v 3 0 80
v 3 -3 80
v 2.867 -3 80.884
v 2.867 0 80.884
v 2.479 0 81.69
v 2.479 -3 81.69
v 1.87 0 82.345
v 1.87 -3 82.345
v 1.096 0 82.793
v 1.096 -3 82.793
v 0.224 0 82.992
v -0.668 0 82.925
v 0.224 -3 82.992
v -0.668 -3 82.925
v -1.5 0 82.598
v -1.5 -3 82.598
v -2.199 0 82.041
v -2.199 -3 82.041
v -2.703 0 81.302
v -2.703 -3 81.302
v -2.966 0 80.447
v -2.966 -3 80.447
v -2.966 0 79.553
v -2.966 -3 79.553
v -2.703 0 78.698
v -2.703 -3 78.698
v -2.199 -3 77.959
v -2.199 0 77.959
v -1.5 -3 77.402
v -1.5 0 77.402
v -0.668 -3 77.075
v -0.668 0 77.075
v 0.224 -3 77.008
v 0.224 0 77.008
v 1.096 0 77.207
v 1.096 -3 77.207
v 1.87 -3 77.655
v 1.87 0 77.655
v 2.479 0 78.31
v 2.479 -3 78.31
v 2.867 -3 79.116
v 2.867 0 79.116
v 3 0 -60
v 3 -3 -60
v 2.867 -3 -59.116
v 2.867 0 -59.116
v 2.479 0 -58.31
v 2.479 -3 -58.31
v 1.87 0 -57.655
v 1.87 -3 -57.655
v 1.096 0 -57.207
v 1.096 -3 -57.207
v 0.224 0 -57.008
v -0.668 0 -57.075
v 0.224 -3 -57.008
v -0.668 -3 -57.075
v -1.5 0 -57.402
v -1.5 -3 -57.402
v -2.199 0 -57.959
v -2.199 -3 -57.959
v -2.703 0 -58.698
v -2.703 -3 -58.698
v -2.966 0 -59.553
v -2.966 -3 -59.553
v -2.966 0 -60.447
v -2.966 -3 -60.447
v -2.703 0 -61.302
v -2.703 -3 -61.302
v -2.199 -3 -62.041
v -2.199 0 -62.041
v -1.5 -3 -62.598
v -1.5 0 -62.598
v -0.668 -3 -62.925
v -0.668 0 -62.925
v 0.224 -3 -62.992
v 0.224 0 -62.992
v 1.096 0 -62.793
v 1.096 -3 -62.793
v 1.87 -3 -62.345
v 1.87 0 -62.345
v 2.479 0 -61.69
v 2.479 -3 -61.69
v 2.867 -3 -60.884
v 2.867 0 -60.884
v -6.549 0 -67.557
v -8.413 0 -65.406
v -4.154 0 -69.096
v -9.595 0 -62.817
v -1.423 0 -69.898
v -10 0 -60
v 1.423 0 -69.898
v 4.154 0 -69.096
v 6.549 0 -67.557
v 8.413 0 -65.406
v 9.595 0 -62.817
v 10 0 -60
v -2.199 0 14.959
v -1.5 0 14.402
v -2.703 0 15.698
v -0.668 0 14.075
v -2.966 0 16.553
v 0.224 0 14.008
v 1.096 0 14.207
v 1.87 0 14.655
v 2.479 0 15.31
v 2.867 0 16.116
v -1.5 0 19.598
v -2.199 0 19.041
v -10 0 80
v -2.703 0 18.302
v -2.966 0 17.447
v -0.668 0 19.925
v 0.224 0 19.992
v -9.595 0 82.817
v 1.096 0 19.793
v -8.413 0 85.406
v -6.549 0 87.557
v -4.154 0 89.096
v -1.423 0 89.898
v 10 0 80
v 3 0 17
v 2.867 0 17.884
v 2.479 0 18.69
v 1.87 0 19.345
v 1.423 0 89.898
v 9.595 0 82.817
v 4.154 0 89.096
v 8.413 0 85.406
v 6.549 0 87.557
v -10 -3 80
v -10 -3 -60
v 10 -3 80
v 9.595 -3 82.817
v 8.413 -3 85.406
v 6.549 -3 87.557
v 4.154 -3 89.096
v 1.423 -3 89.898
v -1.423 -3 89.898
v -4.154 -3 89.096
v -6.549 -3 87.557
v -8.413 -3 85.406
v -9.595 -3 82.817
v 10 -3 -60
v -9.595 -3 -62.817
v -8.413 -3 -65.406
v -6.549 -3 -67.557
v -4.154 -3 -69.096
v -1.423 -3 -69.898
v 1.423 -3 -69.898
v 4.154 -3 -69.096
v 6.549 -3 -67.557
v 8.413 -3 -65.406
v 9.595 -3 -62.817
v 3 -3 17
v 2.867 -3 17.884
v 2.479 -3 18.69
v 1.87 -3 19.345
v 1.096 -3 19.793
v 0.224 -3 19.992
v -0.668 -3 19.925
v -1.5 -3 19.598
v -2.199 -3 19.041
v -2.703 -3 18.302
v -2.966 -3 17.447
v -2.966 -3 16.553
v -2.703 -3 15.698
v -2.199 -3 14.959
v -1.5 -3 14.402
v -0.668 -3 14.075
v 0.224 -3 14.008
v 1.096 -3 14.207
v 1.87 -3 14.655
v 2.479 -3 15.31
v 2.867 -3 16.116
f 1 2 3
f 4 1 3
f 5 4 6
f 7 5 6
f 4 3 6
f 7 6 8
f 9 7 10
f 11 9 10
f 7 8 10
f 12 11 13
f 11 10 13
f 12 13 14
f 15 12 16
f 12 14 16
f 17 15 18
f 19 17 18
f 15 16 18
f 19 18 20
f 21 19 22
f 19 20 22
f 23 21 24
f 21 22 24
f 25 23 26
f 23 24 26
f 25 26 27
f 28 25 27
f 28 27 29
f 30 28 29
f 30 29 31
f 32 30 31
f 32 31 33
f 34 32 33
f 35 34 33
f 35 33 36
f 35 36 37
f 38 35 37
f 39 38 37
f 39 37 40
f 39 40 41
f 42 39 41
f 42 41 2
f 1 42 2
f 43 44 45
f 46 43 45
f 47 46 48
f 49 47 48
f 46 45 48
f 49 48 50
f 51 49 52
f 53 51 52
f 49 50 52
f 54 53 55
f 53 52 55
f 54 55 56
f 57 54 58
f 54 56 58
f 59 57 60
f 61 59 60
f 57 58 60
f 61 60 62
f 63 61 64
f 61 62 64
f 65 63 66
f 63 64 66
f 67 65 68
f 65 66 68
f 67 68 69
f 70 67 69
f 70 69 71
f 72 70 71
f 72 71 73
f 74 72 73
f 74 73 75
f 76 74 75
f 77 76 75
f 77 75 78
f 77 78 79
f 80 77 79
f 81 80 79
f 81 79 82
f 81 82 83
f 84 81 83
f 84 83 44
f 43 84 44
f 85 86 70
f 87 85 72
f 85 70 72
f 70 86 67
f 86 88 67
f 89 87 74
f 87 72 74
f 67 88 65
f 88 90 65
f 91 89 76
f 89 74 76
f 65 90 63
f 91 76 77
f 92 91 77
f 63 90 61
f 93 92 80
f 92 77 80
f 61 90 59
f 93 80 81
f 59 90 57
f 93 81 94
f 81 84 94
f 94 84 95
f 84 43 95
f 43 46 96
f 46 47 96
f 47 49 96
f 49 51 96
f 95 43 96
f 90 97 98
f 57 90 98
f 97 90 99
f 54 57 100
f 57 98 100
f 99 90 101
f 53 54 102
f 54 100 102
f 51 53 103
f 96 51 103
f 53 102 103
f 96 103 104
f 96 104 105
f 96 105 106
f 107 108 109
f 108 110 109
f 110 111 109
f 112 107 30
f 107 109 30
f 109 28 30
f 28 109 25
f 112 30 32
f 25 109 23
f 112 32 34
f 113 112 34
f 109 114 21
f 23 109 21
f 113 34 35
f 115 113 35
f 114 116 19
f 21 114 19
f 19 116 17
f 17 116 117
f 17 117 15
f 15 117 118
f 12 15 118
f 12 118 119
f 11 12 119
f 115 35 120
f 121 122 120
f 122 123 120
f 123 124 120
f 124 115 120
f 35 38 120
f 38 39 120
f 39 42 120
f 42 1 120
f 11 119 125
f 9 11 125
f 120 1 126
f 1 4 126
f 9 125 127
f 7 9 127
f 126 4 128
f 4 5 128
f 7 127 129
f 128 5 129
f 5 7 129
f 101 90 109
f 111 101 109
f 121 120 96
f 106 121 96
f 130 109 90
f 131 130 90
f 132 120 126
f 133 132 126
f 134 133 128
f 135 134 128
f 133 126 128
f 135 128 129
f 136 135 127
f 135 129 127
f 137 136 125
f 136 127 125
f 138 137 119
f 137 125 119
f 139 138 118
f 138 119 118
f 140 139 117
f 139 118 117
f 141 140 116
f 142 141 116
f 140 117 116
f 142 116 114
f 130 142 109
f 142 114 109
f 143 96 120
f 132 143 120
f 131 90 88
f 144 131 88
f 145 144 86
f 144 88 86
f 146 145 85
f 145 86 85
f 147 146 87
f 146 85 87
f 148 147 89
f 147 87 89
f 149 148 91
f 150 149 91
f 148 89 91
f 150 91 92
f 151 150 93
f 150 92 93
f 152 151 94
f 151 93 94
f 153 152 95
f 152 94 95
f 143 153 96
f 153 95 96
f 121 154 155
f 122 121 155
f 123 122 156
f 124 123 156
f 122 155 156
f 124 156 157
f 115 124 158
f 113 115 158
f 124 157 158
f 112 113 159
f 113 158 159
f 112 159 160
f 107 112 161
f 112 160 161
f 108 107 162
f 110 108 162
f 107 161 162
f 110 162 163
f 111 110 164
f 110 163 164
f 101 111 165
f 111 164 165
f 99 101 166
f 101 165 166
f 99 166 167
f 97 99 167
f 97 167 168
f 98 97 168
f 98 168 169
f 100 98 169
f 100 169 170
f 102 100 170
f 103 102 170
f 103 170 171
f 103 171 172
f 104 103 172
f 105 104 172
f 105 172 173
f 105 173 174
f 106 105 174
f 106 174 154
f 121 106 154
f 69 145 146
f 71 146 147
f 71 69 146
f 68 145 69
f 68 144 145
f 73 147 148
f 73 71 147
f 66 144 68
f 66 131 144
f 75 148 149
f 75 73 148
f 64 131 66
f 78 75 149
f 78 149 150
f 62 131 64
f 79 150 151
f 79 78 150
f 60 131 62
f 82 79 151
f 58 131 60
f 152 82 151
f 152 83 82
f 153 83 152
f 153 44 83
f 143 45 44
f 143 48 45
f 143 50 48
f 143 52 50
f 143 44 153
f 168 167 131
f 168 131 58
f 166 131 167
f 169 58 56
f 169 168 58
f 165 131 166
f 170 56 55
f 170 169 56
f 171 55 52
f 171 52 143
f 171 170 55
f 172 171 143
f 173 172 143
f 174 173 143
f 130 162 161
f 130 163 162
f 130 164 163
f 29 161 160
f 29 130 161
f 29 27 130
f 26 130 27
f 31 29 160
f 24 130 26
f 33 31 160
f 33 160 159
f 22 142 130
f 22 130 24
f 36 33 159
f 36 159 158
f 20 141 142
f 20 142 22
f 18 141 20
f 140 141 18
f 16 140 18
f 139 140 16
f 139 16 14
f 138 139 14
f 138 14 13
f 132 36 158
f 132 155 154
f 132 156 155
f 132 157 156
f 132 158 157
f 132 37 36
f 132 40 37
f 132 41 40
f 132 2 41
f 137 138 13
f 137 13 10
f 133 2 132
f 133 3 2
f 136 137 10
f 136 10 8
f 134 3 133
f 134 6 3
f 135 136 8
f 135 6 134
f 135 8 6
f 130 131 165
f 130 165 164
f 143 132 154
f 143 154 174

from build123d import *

# Parameters (mm, degrees)
F1_DEPTH = 3
F2_R     = 3
F3_DEPTH = 25.4
F4_R     = 3
F5_DEPTH = 25


with BuildPart() as f1:
    # F0 (on Front) → F1 (new body)
    with BuildSketch(Plane.XZ):
        with BuildLine():
            ThreePointArc((-10, 80), (0, 70), (10, 80))
            ThreePointArc((10, 80), (0, 90), (-10, 80))
        make_face()
        with BuildLine():
            Line((10, -60), (10, 80))
            ThreePointArc((10, 80), (0, 70), (-10, 80))
            Line((-10, 80), (-10, -60))
            ThreePointArc((-10, -60), (0, -50), (10, -60))
        make_face()
        with BuildLine():
            ThreePointArc((-10, -60), (0, -70), (10, -60))
            ThreePointArc((10, -60), (0, -50), (-10, -60))
        make_face()
    extrude(amount=F1_DEPTH)

    # F2 (on face) → F3 (cut)
    with BuildSketch(Plane.XZ.offset(3)):
        with Locations((0, 80)):
            Circle(F2_R)
        with Locations((0, -60)):
            Circle(F2_R)
    extrude(amount=-F3_DEPTH, mode=Mode.SUBTRACT)

    # F4 (on face) → F5 (cut)
    with BuildSketch(Plane.XZ.offset(3)):
        with Locations((0, 17)):
            Circle(F4_R)
    extrude(amount=-F5_DEPTH, mode=Mode.SUBTRACT)


solid = f1.part
